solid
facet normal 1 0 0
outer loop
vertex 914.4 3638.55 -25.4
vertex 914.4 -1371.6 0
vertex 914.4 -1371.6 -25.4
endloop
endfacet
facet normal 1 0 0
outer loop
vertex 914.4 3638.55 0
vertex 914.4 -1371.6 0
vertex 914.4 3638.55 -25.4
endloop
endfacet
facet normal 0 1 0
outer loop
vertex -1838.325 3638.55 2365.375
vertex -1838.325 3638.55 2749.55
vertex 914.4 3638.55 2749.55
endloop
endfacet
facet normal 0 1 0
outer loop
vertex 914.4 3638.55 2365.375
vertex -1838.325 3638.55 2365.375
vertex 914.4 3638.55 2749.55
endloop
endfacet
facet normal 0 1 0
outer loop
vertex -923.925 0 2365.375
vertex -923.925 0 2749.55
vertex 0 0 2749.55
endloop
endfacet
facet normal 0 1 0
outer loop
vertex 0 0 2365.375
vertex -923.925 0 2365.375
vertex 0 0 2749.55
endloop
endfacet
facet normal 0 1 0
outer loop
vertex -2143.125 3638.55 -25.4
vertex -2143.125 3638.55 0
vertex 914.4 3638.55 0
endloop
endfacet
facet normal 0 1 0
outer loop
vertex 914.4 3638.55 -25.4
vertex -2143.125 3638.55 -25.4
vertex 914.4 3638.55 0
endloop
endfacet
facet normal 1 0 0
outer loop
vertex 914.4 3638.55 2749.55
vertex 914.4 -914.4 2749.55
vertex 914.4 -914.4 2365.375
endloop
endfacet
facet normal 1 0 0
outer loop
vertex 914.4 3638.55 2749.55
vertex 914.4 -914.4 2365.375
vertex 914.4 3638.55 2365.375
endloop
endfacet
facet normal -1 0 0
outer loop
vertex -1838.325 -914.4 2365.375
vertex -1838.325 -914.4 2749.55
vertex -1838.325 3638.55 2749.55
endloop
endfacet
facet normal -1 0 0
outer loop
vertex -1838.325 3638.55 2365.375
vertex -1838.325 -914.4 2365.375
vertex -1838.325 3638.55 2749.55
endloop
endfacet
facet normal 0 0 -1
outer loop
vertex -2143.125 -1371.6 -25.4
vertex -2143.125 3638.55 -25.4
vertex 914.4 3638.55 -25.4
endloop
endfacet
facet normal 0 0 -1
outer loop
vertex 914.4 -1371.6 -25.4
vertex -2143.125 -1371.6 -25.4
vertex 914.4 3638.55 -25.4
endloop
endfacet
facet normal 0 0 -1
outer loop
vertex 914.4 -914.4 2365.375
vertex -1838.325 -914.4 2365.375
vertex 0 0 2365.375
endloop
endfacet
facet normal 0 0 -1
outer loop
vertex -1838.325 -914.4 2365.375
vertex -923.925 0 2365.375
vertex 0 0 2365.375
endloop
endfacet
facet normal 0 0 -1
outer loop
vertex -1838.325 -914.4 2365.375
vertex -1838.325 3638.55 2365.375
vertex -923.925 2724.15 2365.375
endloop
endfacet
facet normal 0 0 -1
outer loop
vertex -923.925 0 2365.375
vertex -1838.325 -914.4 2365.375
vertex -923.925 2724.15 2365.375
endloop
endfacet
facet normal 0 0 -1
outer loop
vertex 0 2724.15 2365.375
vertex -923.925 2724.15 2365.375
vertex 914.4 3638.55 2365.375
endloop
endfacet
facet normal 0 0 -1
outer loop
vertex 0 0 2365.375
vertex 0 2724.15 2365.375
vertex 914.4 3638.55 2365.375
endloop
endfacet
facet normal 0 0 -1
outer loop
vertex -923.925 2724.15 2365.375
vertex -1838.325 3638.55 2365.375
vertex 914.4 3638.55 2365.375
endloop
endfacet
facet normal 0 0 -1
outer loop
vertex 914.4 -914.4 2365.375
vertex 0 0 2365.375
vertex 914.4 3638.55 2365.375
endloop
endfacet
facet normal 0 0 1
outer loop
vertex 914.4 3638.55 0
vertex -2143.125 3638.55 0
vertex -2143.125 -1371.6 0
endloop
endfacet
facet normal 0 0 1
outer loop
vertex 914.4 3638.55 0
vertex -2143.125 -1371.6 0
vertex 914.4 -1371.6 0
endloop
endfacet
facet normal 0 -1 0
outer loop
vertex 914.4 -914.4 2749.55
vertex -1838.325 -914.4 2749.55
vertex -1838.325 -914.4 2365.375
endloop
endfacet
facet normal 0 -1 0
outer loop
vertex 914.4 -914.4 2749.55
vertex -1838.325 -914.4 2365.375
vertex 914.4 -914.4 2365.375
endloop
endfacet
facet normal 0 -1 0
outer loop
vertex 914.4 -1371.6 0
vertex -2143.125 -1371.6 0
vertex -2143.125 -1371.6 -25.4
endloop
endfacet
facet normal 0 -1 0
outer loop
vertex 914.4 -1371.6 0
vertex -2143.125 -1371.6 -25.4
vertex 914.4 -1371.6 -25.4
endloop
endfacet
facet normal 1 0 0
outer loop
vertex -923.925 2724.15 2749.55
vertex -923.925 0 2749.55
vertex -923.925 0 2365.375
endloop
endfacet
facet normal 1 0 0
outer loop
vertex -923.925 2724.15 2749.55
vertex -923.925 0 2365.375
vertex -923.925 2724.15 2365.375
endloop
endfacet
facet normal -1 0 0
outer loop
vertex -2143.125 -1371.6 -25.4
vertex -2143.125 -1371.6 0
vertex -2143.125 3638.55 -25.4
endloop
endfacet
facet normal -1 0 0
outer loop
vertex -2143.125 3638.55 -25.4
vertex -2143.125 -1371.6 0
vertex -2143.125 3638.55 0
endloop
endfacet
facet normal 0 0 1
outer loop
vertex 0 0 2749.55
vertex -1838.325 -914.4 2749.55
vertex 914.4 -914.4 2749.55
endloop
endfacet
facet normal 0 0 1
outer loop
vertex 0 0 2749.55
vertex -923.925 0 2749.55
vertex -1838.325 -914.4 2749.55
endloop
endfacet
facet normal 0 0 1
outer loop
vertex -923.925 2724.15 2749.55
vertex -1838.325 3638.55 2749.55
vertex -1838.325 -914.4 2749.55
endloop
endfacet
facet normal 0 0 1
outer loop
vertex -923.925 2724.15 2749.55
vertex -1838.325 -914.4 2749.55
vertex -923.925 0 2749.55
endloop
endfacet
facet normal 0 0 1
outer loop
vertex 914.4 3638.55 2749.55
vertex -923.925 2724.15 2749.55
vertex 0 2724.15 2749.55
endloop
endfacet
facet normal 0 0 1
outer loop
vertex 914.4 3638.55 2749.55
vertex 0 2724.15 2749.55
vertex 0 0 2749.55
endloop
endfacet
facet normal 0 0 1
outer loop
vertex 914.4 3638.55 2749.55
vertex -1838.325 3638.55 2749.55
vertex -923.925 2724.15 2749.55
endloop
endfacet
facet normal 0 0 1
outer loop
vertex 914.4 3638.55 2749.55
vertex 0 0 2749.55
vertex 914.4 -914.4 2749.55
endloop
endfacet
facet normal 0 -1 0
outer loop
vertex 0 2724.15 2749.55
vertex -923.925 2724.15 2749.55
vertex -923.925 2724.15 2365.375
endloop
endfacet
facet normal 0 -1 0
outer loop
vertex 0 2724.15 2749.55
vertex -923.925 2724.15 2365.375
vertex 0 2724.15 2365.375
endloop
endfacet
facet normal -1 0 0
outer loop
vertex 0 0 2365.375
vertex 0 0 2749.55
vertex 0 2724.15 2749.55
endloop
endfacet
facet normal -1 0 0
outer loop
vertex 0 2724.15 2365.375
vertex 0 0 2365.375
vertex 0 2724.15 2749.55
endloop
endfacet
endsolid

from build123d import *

# Parameters (mm, degrees)
F1_W     = 2752.725
F1_H     = 4552.95
F1_W_2   = 923.925
F1_H_2   = 2724.15
F2_DEPTH = 384.175
F3_W     = 3057.525
F3_H     = 5010.15
F4_DEPTH = 25.4


with BuildPart() as f2:
    # F1 (on offset) → F2 (new body)
    with BuildSketch(Plane.XY.offset(2749.55)):
        with Locations((-461.9625, 1362.075)):
            Rectangle(F1_W, F1_H)
        with Locations((-461.9625, 1362.075)):
            Rectangle(F1_W_2, F1_H_2, mode=Mode.SUBTRACT)
    extrude(amount=-F2_DEPTH)


with BuildPart() as f4:
    # F3 (on Top) → F4 (new body)
    with BuildSketch(Plane.XY):
        with Locations((-614.3625, 1133.475)):
            Rectangle(F3_W, F3_H)
    extrude(amount=-F4_DEPTH)


solid = Compound([f2.part, f4.part])
